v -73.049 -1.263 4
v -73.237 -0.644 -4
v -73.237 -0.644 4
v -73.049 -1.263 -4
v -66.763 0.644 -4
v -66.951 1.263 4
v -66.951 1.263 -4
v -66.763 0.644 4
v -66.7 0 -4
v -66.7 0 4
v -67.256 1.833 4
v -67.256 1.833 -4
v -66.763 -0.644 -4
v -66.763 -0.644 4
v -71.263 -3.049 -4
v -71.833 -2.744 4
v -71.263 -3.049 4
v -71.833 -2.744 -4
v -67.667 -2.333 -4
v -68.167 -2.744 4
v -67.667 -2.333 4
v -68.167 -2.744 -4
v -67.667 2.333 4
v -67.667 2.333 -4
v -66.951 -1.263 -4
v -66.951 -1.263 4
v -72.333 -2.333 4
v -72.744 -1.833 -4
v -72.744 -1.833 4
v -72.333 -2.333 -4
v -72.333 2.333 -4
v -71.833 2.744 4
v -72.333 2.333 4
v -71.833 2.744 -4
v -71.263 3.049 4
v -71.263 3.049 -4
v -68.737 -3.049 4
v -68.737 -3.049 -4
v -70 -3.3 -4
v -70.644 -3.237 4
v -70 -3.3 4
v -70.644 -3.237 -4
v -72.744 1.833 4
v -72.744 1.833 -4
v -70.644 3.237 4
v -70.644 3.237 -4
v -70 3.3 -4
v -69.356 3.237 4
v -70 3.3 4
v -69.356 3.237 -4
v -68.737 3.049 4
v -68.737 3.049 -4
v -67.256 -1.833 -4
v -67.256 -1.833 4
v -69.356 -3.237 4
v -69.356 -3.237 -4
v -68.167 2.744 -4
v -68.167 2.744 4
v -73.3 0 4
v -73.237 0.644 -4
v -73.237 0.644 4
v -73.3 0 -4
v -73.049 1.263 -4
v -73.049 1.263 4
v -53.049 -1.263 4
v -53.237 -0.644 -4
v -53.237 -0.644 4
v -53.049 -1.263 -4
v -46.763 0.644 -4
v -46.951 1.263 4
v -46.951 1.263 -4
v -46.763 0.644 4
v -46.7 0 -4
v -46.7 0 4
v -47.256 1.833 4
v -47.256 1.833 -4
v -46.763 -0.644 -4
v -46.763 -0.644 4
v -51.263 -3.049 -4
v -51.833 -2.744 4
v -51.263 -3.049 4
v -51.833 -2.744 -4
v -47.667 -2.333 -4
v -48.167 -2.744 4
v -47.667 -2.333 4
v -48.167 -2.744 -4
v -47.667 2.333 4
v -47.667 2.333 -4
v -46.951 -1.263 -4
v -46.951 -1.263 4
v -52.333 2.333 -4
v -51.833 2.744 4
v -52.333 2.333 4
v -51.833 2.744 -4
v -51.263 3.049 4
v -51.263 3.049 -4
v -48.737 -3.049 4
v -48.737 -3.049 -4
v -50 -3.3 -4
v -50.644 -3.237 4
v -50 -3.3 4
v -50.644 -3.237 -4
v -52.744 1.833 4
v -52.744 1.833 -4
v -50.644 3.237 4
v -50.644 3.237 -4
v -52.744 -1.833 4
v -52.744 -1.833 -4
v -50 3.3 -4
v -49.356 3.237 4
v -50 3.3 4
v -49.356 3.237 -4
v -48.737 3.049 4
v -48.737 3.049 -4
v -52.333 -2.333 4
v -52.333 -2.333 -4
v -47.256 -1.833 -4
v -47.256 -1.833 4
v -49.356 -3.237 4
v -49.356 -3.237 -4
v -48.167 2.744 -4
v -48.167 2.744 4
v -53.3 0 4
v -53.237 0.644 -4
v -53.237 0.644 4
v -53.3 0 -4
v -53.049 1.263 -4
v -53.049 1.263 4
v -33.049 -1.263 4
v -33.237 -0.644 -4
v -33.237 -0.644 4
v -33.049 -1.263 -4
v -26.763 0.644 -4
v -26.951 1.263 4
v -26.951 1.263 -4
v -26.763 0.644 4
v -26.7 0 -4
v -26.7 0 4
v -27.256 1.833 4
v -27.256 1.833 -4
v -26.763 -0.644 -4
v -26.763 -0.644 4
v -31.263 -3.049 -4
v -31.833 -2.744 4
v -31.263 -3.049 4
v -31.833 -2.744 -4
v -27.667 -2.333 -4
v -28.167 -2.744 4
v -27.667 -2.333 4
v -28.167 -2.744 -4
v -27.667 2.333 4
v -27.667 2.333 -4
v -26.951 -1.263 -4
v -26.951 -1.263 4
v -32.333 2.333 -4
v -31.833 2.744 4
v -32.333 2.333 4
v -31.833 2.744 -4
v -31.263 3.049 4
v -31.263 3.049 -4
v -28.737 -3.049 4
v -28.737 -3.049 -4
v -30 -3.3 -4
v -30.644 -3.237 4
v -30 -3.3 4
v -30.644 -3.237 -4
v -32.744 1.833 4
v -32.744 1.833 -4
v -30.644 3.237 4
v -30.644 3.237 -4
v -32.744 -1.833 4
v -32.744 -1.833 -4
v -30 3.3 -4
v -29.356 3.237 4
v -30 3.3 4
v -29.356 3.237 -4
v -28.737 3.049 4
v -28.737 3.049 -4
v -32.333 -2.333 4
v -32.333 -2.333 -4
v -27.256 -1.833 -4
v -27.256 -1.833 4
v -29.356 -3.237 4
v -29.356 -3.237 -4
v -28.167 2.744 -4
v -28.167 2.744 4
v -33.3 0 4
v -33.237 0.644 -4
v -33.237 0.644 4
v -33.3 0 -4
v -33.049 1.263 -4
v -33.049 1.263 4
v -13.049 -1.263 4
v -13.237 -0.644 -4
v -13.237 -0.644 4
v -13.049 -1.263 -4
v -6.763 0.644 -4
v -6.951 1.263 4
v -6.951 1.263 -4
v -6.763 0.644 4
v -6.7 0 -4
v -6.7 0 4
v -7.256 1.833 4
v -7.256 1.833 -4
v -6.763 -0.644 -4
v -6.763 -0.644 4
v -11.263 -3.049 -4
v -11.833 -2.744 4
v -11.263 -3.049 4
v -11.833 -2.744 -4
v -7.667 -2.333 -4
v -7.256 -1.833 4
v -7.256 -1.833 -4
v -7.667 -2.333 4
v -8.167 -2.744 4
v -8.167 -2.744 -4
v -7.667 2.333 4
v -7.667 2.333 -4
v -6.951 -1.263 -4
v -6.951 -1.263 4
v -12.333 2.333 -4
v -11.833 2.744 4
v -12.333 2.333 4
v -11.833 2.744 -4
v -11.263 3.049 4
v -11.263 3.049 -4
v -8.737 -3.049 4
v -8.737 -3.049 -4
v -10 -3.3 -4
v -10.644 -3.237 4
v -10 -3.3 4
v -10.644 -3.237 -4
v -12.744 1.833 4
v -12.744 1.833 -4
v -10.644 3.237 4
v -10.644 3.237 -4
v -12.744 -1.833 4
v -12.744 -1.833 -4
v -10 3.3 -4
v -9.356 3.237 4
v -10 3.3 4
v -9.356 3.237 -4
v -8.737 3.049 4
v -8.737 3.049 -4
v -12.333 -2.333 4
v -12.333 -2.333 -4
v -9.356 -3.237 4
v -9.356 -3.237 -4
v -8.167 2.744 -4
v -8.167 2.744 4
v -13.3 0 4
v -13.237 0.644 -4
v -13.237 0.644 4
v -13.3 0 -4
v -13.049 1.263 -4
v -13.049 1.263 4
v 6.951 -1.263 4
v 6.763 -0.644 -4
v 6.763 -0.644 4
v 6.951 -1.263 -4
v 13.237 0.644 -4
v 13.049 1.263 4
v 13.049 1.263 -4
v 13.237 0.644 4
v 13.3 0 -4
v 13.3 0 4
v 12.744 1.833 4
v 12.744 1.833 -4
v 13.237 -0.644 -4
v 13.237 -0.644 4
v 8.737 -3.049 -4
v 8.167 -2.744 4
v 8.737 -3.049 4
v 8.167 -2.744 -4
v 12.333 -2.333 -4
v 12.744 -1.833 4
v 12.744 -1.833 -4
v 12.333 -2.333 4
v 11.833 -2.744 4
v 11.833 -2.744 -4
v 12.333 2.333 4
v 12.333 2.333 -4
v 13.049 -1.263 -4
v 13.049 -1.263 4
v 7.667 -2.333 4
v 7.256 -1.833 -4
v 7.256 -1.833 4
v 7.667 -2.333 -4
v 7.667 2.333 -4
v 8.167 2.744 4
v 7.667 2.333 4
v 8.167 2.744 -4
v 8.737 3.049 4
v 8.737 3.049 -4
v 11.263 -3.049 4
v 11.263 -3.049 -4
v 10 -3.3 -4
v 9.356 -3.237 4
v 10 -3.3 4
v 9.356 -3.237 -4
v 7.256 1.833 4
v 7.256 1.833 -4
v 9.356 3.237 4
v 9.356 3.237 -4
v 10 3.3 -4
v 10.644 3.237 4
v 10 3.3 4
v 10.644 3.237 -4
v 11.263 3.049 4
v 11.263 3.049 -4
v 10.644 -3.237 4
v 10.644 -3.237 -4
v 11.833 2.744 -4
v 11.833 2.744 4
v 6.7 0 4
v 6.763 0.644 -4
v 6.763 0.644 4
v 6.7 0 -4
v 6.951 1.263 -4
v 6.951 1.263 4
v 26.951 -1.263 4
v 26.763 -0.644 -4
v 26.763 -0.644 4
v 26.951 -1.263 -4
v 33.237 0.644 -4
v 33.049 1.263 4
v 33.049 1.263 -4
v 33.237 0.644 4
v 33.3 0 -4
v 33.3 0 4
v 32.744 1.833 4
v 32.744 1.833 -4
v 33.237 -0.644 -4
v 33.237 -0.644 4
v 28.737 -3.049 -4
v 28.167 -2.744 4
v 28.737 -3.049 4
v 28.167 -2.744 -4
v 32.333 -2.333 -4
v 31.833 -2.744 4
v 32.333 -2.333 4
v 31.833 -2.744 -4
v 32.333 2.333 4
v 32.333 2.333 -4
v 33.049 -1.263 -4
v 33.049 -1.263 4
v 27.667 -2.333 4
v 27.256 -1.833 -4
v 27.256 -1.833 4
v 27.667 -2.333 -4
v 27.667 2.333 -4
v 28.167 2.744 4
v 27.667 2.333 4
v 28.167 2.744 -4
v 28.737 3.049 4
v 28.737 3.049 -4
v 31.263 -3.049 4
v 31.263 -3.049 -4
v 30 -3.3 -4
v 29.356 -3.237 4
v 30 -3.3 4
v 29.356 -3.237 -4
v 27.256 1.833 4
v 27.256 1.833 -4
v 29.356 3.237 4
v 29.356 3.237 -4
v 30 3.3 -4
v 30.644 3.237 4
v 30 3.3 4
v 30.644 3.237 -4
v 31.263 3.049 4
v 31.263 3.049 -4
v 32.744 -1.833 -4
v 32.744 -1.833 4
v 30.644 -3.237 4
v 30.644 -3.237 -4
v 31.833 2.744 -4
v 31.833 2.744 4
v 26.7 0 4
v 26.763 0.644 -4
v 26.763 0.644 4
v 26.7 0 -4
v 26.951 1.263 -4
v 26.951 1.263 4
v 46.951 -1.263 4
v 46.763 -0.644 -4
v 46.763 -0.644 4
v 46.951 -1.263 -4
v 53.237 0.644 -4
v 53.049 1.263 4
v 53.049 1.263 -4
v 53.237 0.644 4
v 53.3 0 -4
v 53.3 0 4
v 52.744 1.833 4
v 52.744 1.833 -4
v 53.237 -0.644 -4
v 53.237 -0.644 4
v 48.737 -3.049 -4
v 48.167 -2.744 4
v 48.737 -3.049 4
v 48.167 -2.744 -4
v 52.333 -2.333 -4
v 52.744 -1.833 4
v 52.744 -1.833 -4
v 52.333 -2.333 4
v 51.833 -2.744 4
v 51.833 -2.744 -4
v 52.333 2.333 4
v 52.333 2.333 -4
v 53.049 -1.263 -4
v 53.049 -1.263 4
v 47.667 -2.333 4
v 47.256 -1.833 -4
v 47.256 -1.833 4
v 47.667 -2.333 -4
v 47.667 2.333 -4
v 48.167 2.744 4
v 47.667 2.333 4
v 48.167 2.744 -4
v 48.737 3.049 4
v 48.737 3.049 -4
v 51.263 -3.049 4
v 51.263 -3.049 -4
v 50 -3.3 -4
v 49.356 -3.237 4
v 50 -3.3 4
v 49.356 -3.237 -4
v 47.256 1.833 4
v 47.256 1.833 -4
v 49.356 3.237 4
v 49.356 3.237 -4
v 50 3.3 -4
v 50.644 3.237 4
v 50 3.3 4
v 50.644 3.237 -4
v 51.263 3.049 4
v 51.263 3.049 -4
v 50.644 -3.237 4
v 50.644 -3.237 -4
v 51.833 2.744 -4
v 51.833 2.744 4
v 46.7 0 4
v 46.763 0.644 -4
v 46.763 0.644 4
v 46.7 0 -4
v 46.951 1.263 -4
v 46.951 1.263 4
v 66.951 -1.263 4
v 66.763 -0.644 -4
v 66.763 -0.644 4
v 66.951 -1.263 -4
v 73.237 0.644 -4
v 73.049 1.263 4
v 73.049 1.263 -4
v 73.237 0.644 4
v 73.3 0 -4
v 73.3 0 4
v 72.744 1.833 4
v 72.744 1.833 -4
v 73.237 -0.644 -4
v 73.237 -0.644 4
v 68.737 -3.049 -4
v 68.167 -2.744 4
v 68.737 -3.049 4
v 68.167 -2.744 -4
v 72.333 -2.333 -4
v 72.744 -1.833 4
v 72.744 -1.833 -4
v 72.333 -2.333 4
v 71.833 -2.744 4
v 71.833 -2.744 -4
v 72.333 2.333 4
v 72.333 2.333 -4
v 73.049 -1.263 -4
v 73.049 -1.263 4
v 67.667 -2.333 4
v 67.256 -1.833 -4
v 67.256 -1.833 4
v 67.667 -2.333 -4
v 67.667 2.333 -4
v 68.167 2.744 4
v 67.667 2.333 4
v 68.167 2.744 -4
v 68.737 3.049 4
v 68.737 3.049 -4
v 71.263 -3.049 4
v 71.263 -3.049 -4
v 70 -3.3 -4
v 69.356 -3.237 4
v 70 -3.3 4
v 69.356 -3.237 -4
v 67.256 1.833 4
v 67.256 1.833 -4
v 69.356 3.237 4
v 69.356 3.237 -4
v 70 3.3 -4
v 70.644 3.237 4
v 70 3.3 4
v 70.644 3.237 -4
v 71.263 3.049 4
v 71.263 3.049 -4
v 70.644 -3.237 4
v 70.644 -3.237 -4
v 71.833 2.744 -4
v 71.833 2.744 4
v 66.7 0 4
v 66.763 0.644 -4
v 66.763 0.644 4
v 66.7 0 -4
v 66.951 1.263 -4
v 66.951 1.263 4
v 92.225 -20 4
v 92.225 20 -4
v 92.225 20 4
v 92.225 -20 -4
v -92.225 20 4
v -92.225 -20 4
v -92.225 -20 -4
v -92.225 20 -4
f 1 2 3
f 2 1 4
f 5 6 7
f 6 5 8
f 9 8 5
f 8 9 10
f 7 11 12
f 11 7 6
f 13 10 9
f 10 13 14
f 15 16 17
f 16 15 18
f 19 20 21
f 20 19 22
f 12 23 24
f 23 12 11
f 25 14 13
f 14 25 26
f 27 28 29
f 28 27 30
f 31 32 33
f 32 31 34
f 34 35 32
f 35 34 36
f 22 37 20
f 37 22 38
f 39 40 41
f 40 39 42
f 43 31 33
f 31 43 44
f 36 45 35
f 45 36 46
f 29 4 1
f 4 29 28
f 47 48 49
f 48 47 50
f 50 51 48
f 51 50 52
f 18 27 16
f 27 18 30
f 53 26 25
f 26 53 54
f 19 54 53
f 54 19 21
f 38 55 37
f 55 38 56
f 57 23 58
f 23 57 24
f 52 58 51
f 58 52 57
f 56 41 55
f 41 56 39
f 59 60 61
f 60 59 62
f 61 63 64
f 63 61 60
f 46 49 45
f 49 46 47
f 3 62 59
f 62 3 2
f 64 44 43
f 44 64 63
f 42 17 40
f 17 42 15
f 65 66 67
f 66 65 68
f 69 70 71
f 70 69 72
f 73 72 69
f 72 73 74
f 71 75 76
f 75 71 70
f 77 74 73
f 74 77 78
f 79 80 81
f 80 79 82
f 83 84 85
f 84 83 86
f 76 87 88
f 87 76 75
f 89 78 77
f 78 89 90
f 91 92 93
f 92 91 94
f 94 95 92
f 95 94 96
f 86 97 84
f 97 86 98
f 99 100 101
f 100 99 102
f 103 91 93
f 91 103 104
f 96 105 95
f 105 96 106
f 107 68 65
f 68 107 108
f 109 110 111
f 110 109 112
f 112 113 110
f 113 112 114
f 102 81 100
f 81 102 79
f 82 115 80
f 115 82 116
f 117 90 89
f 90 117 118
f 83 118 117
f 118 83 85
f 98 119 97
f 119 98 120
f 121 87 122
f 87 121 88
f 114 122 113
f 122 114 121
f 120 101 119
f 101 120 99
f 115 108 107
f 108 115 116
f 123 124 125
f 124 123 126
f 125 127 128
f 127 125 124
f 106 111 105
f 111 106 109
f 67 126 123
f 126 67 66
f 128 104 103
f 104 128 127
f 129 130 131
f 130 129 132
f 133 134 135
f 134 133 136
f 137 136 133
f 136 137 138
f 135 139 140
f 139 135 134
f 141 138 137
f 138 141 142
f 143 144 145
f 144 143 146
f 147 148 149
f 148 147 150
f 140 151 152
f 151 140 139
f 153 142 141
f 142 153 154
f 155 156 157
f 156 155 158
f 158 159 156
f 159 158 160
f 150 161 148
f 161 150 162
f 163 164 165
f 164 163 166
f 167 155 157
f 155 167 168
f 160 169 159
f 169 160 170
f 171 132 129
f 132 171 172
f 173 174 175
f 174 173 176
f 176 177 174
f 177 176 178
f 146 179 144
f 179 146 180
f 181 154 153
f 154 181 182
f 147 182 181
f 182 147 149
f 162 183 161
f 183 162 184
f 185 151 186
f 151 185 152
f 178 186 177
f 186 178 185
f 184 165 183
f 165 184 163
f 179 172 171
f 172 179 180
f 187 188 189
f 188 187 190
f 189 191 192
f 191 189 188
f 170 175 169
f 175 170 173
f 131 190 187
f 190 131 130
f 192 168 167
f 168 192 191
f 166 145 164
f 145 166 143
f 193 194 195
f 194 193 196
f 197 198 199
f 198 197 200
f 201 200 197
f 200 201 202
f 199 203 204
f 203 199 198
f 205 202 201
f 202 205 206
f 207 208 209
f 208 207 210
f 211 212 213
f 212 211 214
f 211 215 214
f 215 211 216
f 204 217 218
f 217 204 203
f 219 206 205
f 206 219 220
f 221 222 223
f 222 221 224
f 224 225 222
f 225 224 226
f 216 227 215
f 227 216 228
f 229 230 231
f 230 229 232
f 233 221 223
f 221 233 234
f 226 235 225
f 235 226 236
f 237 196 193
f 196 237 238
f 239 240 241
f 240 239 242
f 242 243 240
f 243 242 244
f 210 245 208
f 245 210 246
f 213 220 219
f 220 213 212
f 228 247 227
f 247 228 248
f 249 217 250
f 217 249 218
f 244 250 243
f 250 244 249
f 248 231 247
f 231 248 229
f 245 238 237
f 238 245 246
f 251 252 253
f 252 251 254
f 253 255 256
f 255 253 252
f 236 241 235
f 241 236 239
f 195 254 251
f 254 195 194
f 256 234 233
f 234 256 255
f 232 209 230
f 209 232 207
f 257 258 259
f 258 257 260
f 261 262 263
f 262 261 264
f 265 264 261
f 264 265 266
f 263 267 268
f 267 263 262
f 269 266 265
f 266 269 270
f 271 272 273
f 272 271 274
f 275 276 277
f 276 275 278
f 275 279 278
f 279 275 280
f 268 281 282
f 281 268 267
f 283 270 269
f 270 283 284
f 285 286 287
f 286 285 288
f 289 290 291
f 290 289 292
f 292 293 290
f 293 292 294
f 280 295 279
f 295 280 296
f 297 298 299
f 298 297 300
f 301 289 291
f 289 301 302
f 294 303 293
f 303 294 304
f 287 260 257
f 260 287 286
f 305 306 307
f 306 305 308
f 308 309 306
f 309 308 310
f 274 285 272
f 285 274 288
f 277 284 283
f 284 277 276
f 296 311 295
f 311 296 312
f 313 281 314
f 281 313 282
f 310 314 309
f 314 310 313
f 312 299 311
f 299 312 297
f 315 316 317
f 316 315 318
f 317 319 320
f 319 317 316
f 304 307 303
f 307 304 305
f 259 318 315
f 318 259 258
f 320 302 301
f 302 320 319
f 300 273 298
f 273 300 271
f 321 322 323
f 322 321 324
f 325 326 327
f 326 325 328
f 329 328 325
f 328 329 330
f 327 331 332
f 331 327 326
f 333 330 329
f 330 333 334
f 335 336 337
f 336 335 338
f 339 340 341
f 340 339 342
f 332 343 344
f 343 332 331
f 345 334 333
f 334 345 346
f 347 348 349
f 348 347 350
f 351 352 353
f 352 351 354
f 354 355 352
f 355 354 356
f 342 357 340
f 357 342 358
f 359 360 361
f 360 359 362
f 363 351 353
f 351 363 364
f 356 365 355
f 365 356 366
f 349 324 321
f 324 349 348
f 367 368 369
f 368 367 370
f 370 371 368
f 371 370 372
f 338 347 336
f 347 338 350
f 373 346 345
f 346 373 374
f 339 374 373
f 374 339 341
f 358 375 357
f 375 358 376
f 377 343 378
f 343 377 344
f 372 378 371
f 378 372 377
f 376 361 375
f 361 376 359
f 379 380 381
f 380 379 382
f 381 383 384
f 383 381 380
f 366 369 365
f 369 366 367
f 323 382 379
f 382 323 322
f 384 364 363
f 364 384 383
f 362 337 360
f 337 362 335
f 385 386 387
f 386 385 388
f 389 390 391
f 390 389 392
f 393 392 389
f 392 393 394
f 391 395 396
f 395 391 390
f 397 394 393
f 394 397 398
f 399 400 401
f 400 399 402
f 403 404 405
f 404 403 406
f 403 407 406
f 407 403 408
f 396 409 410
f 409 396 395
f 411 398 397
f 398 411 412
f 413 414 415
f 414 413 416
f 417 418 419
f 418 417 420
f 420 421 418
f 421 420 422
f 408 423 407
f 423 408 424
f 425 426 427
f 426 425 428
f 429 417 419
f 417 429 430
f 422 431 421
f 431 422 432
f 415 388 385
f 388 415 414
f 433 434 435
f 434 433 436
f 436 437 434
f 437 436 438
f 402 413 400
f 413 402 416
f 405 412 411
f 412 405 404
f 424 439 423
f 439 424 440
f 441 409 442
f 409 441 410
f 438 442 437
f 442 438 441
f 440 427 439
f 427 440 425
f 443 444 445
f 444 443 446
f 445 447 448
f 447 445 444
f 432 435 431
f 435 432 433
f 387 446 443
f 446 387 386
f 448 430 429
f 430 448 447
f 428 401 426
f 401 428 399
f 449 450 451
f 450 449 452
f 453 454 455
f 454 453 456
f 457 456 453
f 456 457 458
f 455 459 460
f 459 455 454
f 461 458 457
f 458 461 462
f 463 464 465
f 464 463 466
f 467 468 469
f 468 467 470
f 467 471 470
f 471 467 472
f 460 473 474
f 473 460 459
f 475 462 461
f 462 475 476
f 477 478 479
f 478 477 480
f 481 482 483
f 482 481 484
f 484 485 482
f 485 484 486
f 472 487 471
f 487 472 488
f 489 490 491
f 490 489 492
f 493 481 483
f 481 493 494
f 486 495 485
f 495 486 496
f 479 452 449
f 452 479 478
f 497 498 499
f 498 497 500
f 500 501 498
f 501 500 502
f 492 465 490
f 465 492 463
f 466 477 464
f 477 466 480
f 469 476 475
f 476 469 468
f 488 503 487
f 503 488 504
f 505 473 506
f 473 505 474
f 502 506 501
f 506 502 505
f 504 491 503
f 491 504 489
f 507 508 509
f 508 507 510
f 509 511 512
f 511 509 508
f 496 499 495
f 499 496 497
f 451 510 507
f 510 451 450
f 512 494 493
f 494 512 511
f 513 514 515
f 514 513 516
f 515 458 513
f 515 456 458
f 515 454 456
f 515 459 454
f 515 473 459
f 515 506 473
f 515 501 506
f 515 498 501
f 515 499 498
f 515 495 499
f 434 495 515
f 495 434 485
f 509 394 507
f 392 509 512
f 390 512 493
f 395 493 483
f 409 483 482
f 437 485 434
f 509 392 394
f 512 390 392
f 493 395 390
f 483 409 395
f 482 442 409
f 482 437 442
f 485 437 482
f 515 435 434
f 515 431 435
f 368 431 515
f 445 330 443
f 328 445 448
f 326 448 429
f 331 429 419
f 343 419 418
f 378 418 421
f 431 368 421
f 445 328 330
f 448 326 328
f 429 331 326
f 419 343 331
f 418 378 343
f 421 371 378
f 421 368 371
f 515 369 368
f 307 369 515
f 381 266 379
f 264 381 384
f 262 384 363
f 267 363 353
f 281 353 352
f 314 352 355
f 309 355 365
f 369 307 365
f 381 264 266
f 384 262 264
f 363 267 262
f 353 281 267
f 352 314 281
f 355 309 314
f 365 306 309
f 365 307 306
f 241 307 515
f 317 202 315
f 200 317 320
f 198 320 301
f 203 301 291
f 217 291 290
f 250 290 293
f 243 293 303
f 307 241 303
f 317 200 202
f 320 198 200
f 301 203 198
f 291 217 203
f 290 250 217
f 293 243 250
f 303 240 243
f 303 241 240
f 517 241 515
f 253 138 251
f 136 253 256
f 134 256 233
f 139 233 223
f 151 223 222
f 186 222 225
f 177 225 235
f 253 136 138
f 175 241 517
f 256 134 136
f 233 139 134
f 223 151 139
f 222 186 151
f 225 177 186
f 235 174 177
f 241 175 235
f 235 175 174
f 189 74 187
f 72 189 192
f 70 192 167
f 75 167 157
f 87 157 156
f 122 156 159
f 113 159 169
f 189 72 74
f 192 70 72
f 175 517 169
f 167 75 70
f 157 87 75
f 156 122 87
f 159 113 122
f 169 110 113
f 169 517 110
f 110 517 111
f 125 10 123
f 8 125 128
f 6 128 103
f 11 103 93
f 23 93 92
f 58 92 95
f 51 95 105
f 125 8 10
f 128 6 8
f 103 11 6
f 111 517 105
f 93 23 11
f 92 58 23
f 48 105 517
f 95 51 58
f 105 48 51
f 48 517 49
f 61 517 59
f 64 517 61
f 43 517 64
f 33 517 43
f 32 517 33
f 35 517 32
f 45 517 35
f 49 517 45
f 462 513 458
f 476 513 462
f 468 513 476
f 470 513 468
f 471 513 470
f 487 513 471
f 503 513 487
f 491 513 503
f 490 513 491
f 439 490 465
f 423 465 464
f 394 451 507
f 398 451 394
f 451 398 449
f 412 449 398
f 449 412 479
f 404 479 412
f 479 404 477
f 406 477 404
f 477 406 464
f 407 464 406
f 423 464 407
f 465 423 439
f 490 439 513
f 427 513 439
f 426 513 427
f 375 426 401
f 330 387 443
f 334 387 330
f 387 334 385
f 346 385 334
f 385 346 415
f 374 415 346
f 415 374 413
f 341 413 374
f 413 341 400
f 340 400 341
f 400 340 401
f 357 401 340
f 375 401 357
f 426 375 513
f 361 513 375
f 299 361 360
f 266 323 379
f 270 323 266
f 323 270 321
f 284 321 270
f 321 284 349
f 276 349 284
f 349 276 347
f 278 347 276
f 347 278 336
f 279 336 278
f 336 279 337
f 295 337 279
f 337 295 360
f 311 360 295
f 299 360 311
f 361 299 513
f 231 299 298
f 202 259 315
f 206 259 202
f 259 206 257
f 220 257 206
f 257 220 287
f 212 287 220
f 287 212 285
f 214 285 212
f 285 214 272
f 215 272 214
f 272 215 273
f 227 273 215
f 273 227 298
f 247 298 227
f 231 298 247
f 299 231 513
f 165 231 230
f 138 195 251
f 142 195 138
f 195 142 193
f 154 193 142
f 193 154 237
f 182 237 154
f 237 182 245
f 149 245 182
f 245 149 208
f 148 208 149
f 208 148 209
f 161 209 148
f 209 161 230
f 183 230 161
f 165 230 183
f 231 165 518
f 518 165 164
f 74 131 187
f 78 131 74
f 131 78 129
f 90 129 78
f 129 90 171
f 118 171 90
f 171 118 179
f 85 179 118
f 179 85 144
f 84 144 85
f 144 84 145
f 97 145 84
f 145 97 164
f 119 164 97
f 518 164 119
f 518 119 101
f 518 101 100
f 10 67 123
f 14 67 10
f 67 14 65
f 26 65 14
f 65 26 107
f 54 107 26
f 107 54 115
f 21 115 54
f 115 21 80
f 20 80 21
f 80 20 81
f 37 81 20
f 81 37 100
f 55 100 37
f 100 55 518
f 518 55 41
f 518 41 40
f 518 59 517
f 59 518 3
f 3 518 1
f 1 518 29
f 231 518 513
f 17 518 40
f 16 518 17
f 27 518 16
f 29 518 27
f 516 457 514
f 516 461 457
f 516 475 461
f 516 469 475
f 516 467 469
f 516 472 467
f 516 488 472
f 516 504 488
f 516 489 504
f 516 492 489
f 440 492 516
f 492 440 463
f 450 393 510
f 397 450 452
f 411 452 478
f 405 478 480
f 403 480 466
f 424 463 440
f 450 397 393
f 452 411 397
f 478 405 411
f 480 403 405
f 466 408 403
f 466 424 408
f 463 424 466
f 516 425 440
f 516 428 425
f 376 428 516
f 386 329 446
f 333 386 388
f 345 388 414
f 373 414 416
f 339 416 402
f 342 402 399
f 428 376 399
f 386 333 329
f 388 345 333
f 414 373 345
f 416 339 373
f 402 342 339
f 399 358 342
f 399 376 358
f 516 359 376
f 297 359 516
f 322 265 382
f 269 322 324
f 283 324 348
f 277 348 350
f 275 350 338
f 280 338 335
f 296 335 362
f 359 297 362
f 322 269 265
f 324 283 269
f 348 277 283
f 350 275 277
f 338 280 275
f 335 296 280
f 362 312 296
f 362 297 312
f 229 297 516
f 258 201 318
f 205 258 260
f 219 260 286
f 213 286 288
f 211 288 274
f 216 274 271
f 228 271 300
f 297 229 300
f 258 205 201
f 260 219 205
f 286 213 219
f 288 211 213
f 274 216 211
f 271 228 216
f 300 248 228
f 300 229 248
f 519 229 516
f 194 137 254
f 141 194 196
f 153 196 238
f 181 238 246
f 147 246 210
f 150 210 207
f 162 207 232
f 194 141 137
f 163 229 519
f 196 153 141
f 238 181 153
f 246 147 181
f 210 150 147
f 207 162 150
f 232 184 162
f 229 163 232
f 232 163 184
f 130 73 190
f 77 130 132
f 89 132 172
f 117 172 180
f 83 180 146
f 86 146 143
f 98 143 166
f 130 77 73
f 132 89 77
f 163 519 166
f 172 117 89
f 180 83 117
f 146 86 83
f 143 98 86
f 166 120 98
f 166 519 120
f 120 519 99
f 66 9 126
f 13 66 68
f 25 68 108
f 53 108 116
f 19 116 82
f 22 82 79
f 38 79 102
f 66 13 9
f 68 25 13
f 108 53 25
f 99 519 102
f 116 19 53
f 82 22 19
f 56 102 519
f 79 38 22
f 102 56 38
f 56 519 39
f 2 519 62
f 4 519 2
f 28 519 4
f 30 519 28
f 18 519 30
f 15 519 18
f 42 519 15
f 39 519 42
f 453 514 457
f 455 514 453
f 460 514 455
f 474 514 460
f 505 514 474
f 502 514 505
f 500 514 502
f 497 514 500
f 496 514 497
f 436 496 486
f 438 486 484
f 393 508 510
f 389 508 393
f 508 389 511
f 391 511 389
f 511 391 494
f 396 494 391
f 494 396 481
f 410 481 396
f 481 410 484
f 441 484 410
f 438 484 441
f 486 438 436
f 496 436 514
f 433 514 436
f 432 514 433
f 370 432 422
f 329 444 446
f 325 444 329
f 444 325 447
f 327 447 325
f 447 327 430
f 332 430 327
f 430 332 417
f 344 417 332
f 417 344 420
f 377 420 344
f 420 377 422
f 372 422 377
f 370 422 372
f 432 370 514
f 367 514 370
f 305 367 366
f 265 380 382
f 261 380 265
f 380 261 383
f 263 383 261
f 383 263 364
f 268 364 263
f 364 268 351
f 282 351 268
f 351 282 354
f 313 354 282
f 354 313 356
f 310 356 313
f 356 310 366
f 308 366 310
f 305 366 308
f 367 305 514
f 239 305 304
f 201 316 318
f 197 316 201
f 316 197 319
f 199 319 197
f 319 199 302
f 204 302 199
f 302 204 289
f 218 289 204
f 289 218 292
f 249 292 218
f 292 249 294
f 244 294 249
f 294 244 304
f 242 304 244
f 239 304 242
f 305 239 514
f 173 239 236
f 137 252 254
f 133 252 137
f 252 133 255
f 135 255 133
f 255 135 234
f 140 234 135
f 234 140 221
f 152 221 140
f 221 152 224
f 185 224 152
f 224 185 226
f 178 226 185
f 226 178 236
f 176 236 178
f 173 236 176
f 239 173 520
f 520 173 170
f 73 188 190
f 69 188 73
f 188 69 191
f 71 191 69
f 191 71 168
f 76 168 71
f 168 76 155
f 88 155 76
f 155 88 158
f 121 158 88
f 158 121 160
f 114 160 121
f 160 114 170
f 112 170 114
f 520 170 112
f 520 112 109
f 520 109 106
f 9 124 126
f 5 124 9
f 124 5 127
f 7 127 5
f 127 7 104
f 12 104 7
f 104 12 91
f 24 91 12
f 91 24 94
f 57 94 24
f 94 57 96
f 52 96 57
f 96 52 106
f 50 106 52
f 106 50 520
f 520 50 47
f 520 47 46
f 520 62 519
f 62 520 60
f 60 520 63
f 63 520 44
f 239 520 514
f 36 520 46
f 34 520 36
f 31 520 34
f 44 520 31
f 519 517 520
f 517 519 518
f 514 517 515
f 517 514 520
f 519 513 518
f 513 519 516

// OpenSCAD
$fn = 32;

// ----------------------------------------------------------------------
// Hole bar, 8 x Ø6.6
// row layout, 22.225 mm edge offset
// ----------------------------------------------------------------------

// --- parameters (mm) ---
bar_w = 40;      // bar width (Y)
seat_tol = 0.1;  // tolerance at the seating features
free_tol = 0.5;  // general tolerance on the free sizes
bar_t = 8;       // bar thickness (Z)
holes = 8;       // holes per row
hole_d = 6.6;    // hole diameter
edge = 22.225;   // offset from the bar end to the first hole
pitch = 20;      // pitch between neighbouring holes

// --- derived feature positions (mm) ---
span = (holes - 1) * pitch;   // = 140   distance between the end holes
bar_l = span + 2 * edge;      // = 184.45   overall bar length
start_x = -bar_l / 2 + edge;  // = -70   X of the first hole
feature_centers = [
  [start_x + 0 * pitch, 0],
  [start_x + 1 * pitch, 0],
  [start_x + 2 * pitch, 0],
  [start_x + 3 * pitch, 0],
  [start_x + 4 * pitch, 0],
  [start_x + 5 * pitch, 0],
  [start_x + 6 * pitch, 0],
  [start_x + 7 * pitch, 0]
];   // hole centres of the first row

// bar with one row of holes, drilled from feature_centers
difference() {
  translate([-bar_l / 2, -bar_w / 2, -bar_t / 2]) cube([bar_l, bar_w, bar_t]);
  for (centre = feature_centers)
    translate([centre[0], centre[1], 0])
      cylinder(d = hole_d, h = bar_t + 2, center = true);
}
